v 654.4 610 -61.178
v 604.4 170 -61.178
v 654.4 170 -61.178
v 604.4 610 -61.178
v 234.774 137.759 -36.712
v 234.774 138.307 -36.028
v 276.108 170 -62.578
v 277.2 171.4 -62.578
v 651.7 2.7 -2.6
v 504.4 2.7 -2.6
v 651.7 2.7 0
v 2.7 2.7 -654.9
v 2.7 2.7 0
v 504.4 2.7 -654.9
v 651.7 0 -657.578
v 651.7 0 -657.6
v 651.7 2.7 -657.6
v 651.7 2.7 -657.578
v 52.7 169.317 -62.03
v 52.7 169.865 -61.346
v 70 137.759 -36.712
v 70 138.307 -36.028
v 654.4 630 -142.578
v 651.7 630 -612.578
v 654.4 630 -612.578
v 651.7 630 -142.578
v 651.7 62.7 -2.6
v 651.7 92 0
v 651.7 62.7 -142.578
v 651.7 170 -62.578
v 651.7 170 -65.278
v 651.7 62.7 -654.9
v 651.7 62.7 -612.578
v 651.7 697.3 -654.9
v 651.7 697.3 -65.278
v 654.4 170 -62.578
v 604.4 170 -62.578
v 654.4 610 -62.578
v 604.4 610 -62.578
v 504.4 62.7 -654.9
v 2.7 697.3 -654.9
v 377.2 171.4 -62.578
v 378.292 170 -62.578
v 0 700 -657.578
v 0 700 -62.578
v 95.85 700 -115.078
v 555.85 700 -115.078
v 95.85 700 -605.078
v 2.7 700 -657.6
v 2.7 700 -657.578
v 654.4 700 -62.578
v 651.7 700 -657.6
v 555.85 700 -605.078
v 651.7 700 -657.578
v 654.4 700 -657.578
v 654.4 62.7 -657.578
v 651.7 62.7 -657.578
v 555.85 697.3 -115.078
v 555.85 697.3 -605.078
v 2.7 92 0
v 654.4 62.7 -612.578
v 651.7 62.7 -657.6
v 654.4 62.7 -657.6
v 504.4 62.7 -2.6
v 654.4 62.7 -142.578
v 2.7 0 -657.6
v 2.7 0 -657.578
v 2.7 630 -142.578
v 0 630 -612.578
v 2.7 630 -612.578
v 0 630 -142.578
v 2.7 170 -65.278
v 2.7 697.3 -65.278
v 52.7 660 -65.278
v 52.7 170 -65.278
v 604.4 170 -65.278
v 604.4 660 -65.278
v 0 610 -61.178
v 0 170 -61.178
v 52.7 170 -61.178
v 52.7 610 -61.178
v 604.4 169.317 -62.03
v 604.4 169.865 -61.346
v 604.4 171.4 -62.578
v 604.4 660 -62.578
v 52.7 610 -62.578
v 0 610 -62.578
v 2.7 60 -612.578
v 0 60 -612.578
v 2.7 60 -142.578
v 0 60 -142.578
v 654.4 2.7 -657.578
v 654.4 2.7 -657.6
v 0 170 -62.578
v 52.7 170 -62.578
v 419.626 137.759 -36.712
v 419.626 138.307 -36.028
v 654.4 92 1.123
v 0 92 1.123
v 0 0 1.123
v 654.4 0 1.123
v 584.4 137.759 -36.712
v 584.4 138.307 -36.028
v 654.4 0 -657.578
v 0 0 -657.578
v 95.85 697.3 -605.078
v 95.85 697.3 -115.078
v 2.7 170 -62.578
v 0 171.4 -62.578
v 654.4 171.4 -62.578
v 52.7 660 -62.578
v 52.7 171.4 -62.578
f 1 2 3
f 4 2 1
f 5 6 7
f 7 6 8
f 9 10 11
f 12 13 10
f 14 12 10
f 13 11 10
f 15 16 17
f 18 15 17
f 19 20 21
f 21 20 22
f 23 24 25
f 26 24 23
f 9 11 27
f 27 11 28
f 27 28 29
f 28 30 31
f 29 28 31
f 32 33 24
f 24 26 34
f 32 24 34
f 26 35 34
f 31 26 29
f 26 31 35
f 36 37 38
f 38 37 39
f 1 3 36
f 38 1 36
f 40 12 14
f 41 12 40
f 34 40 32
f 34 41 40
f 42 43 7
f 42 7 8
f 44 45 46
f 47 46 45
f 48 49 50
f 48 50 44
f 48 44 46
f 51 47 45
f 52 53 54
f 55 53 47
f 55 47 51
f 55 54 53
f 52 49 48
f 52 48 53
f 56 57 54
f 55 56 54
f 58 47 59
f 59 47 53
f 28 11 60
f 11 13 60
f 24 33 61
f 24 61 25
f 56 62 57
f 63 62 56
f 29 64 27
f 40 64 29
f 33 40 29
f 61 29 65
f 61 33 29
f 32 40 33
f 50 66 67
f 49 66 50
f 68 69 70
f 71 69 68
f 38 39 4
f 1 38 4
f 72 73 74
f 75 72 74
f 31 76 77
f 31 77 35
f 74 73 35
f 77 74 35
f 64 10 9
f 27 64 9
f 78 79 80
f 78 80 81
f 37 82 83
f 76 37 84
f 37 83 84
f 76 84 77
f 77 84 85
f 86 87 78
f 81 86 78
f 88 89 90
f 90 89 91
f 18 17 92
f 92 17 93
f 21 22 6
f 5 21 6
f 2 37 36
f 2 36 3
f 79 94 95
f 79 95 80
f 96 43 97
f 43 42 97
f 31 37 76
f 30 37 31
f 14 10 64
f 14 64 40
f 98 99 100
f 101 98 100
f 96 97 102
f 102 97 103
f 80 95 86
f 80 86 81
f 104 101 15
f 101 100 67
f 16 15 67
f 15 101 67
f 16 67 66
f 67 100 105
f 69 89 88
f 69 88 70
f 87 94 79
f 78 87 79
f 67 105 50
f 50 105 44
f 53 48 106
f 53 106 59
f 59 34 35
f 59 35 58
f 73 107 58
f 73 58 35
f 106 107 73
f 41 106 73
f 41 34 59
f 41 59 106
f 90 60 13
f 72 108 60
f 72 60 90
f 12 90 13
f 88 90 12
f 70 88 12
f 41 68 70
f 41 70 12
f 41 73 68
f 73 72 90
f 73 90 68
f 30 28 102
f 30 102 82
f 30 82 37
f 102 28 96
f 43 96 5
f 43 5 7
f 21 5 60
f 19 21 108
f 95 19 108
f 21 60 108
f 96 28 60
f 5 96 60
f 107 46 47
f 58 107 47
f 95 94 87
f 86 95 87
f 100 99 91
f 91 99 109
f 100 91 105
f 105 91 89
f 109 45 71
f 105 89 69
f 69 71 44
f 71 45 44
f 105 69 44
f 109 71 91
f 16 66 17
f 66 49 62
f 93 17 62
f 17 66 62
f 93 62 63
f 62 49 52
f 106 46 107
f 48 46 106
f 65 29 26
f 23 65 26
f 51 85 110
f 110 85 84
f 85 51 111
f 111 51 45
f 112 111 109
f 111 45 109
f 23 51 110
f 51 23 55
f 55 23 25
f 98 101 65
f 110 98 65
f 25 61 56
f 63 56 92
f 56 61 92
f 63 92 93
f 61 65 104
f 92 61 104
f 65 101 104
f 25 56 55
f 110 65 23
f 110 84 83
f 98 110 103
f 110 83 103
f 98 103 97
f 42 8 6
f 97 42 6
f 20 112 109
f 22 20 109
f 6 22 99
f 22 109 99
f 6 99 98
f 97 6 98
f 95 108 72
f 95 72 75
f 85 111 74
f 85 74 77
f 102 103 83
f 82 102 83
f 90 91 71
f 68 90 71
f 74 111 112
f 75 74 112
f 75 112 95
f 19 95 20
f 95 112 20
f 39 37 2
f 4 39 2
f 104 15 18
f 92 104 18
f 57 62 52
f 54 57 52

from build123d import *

# Parameters (mm, degrees)
BOSS_EXTRUDE2_DEPTH  = 2.7
BOSS_EXTRUDE3_DEPTH  = 2.7
SKETCH5_W            = 654.4
SKETCH5_H            = 657.577951389
BOSS_EXTRUDE4_DEPTH  = 2.7
SKETCH6_W            = 654.4
SKETCH6_H            = 595
BOSS_EXTRUDE5_DEPTH  = 2.7
SKETCH10_W           = 649
SKETCH10_H           = 700
BOSS_EXTRUDE6_DEPTH  = 2.7
SKETCH11_W           = 470
SKETCH11_H           = 570
CUT_EXTRUDE2_DEPTH   = 1163.186353387
CUT_EXTRUDE3_REACH   = 1164.186
SKETCH12_W           = 460
SKETCH12_H           = 490
BOSS_EXTRUDE8_DEPTH  = 2.7
BOSS_EXTRUDE10_DEPTH = 654.4
SKETCH15_W           = 1.4
SKETCH15_H           = 440
BOSS_EXTRUDE12_DEPTH = 52.7
LPATTERN1_COUNT      = 2
LPATTERN1_PITCH      = 604.4
SKETCH16_W           = 354.359713547
SKETCH16_H           = 772.074648607
CUT_EXTRUDE5_DEPTH   = 55
CUT_EXTRUDE6_DEPTH   = 25
SKETCH19_W           = 150
SKETCH19_H           = 655
BOSS_EXTRUDE13_DEPTH = 60


with BuildPart() as part:
    # Sketch2 → Boss-Extrude2 (new body)
    with BuildSketch(Plane(origin=(0, 0, 0), x_dir=(0, 0, -1), z_dir=(1, 0, 0))):
        Polygon((657.577951389, 700), (62.577951389, 700), (62.577951389, 170), (0, 92), (0, 0), (657.577951389, 0), align=None)
    extrude(amount=BOSS_EXTRUDE2_DEPTH)



with BuildPart() as body_2:
    # Sketch4 → Boss-Extrude3 (new body)
    with BuildSketch(Plane(origin=(651.7, 0, 0), x_dir=(0, 0, -1), z_dir=(1, 0, 0))):
        Polygon((657.577951389, 700), (62.577951389, 700), (62.577951389, 170), (0, 92), (0, 0), (657.577951389, 0), align=None)
    extrude(amount=BOSS_EXTRUDE3_DEPTH)


with BuildPart() as part_1:
    add(part.part)

    add(body_2.part)  # Boss-Extrude4 merges body 2
    # Sketch5 → Boss-Extrude4 (add)
    with BuildSketch(Plane(origin=(0, 0, 0), x_dir=(1, 0, 0), z_dir=(0, 1, 0))):
        with Locations((327.2, 328.788975695)):
            Rectangle(SKETCH5_W, SKETCH5_H)
    extrude(amount=BOSS_EXTRUDE4_DEPTH)

    # Sketch6 → Boss-Extrude5 (add)
    with BuildSketch(Plane(origin=(0, 700, 0), x_dir=(-1, 0, 0), z_dir=(0, -1, 0))):
        with Locations((-327.2, 360.077951389)):
            Rectangle(SKETCH6_W, SKETCH6_H)
    extrude(amount=BOSS_EXTRUDE5_DEPTH)

    # Sketch10 → Boss-Extrude6 (add)
    with BuildSketch(Plane.XY.offset(-657.6)):
        with Locations((327.2, 350)):
            Rectangle(SKETCH10_W, SKETCH10_H)
    extrude(amount=BOSS_EXTRUDE6_DEPTH)

    # Sketch11 → Cut-Extrude2 (cut, through all)
    with BuildSketch(Plane.ZY):
        with Locations((-377.577951389, 345)):
            Rectangle(SKETCH11_W, SKETCH11_H)
    extrude(amount=-CUT_EXTRUDE2_DEPTH, mode=Mode.SUBTRACT)

    # Sketch12 → Cut-Extrude3 (cut, up to next)
    with BuildSketch(Plane(origin=(0, 700, 0), x_dir=(1, 0, 0), z_dir=(0, 1, 0)), mode=Mode.PRIVATE) as cut_extrude3_sk1:
        with Locations((325.85, 360.077951389)):
            Rectangle(SKETCH12_W, SKETCH12_H)
    cut_extrude3_tool1 = extrude(cut_extrude3_sk1.sketch, amount=-CUT_EXTRUDE3_REACH, mode=Mode.PRIVATE) & part_1.part
    add(cut_extrude3_tool1.solids().sort_by_distance((325.85, 700, -360.077951))[0], mode=Mode.SUBTRACT)

    # Sketch13 → Boss-Extrude8 (add)
    with BuildSketch(Plane.XY.offset(-62.577951389)):
        Polygon((2.7, 700), (2.7, 170), (52.7, 170), (52.7, 660), (604.4, 660), (604.4, 170), (654.4, 170), (654.4, 700), align=None)
    extrude(amount=-BOSS_EXTRUDE8_DEPTH)



with BuildPart() as body_2_2:
    # Sketch14 → Boss-Extrude10 (new body)
    with BuildSketch(Plane.ZY):
        Polygon((-62.577951389, 170), (-62.577951389, 171.4), (1.123193999, 92), (1.123193999, 0), (0, 0), (0, 92), align=None)
    extrude(amount=-BOSS_EXTRUDE10_DEPTH)

    # Sketch17 → Cut-Extrude6 (cut)
    with BuildSketch(Plane(origin=(0, 36.57544, 45.589289146), x_dir=(1, 0, 0), z_dir=(0, 0.6257795138864832, 0.779999999999998))):
        Polygon((52.7, 170.883908681), (70, 130.425593129), (234.773593129, 130.425593129), (277.2, 172.852), (377.2, 172.852), (419.626406871, 130.425593129), (584.4, 130.425593129), (604.4, 170.883908681), (604.4, 298.93024871), (52.7, 298.93024871), align=None)
    extrude(amount=-CUT_EXTRUDE6_DEPTH, mode=Mode.SUBTRACT)


with BuildPart() as body_3:
    # Sketch15 → Boss-Extrude12 (new body)
    with BuildSketch(Plane.ZY):
        with Locations((-61.877951389, 390)):
            Rectangle(SKETCH15_W, SKETCH15_H)
    boss_extrude12 = extrude(amount=-BOSS_EXTRUDE12_DEPTH)


with BuildPart() as lpattern1_1:
    # LPattern1: Boss-Extrude12 ×2
    with Locations(*[(i * LPATTERN1_PITCH, 0, 0) for i in range(1, LPATTERN1_COUNT)]):
        add(boss_extrude12)

    # Sketch16 → Cut-Extrude5 (cut)
    with BuildSketch(Plane(origin=(654.4, 0, 0), x_dir=(0, 0, -1), z_dir=(1, 0, 0))):
        with Locations((117.246964879, 341.40946149)):
            Rectangle(SKETCH16_W, SKETCH16_H)
    extrude(amount=CUT_EXTRUDE5_DEPTH, mode=Mode.SUBTRACT)


with BuildPart() as part_2:
    add(part_1.part)

    add(body_2_2.part)  # Boss-Extrude13 merges body 2 2
    # Sketch19 → Boss-Extrude13 (add)
    with BuildSketch(Plane(origin=(0, 2.7, 0), x_dir=(1, 0, 0), z_dir=(0, 1, 0))):
        with Locations((579.4, 330.1)):
            Rectangle(SKETCH19_W, SKETCH19_H)
    extrude(amount=BOSS_EXTRUDE13_DEPTH)


solid = Compound([body_3.part, lpattern1_1.part, part_2.part])
